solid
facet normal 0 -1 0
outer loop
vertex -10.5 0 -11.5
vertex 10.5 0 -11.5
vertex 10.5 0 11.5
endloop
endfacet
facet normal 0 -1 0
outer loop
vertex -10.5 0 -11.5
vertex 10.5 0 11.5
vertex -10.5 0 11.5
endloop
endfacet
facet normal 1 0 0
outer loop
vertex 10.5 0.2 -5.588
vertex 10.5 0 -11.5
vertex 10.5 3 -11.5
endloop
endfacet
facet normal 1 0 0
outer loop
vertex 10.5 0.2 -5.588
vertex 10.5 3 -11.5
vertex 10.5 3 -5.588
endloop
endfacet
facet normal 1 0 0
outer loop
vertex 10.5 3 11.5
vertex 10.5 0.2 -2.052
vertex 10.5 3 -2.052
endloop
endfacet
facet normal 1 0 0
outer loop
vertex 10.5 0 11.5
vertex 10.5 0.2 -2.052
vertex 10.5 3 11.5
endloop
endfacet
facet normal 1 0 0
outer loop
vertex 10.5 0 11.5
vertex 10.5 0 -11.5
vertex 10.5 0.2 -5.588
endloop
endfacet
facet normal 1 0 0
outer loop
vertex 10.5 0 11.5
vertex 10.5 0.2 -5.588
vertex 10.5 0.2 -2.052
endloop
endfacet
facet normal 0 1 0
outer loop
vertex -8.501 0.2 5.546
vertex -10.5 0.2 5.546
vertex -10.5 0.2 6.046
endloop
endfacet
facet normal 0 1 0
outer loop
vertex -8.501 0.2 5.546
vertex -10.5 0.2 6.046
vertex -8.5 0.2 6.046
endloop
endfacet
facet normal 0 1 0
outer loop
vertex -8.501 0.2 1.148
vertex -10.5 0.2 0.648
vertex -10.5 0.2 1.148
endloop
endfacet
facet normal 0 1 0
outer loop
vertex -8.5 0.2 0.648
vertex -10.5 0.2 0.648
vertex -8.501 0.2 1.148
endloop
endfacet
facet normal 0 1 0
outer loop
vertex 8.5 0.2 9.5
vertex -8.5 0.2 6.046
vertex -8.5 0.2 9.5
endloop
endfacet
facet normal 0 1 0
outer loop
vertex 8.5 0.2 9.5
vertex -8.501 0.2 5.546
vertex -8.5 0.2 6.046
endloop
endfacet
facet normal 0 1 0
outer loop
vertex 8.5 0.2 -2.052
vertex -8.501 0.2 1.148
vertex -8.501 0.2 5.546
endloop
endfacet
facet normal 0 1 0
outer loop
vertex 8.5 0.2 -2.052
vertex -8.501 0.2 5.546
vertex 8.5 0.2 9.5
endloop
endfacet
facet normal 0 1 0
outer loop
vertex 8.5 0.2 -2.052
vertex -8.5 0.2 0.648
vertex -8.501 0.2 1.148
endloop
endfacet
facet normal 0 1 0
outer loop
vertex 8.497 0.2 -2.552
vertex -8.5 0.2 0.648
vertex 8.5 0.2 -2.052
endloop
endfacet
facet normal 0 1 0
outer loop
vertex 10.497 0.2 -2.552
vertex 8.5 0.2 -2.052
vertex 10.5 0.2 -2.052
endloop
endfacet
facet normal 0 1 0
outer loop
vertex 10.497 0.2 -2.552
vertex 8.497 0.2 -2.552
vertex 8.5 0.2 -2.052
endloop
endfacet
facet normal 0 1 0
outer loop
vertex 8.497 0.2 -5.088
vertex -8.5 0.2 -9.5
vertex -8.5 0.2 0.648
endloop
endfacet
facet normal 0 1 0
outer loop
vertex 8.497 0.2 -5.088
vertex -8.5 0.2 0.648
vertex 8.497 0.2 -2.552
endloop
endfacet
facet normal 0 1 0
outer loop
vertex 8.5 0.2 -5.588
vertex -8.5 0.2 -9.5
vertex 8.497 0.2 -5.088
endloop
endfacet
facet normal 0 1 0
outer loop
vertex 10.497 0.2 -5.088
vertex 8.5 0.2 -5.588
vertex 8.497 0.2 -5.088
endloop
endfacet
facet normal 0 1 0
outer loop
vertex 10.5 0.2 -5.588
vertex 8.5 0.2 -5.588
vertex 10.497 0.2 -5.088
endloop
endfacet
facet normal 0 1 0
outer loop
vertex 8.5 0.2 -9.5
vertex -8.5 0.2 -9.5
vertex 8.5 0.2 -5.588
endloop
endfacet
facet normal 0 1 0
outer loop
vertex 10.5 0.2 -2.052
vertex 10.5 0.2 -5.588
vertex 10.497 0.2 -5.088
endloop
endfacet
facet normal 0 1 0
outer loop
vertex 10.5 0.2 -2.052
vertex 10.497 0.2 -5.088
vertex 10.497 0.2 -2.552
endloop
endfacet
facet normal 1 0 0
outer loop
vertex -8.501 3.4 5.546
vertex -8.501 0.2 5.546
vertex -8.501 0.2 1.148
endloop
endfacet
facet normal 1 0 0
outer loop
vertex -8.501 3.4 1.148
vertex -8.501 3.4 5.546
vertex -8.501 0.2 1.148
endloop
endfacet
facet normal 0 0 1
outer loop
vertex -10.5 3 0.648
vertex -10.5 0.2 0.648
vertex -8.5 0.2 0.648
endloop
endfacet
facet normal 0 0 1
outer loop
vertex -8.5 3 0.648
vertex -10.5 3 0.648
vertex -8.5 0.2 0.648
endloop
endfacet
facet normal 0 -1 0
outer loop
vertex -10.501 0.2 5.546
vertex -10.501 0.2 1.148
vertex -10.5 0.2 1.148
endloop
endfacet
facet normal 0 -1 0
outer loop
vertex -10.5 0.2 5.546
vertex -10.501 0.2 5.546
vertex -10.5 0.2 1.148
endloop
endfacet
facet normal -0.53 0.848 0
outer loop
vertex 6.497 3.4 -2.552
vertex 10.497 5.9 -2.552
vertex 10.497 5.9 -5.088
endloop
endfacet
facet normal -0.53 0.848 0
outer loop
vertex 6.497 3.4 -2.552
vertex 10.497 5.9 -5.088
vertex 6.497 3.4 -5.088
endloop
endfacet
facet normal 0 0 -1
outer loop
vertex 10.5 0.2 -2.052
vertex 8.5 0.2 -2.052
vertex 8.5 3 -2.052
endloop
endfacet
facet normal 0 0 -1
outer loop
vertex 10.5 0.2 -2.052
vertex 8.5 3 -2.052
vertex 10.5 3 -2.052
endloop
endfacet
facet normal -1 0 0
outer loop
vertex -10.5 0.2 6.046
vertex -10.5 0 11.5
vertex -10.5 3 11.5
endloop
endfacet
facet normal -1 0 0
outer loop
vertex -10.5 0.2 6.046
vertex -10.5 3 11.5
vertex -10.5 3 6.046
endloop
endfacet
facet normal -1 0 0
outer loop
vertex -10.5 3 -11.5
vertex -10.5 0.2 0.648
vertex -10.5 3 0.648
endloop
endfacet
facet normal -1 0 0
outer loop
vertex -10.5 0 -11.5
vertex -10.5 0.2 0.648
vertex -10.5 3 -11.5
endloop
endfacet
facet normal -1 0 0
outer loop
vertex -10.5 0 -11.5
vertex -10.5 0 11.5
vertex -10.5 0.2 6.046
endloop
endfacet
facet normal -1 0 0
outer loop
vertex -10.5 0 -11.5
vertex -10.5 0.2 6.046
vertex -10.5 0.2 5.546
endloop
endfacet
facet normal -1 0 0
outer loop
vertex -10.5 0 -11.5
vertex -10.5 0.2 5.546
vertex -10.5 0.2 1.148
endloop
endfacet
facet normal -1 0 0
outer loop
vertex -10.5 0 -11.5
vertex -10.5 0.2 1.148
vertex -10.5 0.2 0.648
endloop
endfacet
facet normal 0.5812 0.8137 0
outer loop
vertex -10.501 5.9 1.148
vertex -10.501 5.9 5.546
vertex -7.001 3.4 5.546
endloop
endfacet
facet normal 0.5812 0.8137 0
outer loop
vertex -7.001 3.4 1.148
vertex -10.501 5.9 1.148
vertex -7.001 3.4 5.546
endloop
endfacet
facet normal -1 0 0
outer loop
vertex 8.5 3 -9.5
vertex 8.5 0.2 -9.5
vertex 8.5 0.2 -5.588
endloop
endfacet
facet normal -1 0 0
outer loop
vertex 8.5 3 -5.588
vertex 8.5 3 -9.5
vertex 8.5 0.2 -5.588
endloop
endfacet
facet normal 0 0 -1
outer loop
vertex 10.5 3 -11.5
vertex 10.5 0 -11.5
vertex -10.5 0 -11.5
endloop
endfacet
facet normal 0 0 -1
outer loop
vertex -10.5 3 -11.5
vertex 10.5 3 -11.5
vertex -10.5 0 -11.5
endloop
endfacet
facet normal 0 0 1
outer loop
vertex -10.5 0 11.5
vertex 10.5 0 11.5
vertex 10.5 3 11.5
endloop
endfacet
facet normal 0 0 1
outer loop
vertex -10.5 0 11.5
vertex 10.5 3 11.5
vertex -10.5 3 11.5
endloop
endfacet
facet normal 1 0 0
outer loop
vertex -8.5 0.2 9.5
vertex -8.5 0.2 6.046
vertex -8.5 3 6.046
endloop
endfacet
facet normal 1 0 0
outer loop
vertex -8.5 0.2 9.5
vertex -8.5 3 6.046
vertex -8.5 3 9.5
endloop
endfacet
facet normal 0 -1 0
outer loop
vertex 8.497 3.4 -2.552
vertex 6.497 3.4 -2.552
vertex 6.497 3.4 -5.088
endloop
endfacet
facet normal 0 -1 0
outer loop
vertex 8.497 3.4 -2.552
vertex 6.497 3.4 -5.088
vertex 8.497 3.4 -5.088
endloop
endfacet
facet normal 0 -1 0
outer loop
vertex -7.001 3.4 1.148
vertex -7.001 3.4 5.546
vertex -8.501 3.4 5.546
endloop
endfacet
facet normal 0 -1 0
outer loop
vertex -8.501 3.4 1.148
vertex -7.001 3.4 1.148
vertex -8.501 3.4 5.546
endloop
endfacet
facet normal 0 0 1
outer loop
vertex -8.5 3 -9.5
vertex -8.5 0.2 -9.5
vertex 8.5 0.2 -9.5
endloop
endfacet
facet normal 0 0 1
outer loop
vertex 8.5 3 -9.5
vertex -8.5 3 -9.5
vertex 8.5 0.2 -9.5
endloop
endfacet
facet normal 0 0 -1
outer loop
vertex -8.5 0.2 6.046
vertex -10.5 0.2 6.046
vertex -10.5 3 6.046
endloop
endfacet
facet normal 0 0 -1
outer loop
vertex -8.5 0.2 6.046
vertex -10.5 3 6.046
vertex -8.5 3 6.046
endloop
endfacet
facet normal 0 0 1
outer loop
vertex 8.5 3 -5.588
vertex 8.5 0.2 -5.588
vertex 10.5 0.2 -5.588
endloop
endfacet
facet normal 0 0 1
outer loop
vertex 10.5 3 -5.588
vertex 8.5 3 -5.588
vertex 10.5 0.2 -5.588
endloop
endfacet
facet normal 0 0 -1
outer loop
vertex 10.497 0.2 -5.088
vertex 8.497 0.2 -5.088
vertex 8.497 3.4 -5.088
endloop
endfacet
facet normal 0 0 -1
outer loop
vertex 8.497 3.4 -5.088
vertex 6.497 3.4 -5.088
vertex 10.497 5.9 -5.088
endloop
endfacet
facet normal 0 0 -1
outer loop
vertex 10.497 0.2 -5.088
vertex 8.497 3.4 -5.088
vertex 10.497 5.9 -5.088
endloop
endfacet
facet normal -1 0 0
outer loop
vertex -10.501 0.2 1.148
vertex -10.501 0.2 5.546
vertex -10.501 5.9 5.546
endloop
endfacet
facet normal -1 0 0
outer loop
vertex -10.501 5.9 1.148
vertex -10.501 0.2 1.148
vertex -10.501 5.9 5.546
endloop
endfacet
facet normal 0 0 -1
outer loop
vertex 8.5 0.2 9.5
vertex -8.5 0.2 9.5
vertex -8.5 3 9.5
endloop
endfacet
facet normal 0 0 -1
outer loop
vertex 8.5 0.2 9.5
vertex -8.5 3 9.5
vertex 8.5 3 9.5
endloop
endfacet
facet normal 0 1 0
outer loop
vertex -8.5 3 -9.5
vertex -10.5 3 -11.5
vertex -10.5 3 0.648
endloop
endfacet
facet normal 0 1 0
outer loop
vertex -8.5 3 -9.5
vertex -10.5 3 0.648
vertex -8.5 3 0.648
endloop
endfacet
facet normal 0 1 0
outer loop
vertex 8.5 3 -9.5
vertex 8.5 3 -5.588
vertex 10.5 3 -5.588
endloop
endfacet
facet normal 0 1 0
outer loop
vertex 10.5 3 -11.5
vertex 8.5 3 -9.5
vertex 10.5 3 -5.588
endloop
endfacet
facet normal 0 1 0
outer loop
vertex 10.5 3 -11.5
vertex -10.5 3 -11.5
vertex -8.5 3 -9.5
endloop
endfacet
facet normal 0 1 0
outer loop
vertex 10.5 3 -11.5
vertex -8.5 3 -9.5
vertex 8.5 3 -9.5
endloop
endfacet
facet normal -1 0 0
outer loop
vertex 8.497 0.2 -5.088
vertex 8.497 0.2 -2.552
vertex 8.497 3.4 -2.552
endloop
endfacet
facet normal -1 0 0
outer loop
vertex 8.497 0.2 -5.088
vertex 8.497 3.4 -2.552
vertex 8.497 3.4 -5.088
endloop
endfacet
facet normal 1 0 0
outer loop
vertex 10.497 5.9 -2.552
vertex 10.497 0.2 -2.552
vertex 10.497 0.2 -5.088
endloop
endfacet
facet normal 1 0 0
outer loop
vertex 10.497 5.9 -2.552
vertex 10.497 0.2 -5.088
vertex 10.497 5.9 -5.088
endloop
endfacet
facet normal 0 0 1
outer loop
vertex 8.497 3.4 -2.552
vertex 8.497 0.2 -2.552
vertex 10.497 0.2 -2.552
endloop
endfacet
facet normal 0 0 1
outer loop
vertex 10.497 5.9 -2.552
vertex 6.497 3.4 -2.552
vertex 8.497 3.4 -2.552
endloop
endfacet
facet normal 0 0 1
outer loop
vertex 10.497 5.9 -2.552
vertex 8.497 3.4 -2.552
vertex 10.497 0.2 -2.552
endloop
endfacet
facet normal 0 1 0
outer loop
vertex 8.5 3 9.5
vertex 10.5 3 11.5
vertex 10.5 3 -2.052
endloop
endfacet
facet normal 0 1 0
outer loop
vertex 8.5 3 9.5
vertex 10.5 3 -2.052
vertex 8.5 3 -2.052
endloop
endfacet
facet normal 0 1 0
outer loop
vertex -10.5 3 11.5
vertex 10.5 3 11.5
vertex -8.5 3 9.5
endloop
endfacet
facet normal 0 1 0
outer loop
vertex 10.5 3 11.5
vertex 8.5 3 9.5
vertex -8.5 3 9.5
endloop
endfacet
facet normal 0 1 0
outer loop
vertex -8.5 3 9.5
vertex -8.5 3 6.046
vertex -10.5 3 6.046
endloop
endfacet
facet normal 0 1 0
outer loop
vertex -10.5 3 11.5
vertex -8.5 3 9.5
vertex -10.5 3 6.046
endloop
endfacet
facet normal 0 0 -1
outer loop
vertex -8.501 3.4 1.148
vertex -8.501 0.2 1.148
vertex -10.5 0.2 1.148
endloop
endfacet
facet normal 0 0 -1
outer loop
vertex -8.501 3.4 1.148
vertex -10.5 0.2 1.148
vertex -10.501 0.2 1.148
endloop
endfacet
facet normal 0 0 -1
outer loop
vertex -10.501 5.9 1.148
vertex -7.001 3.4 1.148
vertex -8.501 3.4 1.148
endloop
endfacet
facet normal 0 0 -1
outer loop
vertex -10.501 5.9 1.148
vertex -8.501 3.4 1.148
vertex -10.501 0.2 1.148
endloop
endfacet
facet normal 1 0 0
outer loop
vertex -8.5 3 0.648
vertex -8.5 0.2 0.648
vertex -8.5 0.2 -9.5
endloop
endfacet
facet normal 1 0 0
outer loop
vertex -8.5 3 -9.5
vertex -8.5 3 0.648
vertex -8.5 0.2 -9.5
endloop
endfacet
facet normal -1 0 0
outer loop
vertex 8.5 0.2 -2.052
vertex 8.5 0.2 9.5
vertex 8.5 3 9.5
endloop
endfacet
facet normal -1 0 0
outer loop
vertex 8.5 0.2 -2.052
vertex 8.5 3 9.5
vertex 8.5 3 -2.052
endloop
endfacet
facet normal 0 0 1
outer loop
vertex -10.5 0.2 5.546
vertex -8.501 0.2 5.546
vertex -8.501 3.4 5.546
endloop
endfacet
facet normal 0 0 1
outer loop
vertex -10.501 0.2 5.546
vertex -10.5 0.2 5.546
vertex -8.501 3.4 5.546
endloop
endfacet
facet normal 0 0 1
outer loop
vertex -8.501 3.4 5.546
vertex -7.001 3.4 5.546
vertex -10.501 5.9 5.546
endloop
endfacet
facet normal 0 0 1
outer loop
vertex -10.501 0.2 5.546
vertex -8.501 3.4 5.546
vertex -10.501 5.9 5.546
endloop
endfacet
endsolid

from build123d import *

# Parameters (mm, degrees)
BOSS_EXTRUDE2_DEPTH   = 3
BOSS_EXTRUDE2_2_DEPTH = 3
SKETCH4_W             = 21
SKETCH4_H             = 23
BOSS_EXTRUDE4_DEPTH   = 0.2
SKETCH6_W             = 2
SKETCH6_H             = 4.398930514
SKETCH6_H_2           = 2.53591928
BOSS_EXTRUDE5_DEPTH   = 3.2
BOSS_EXTRUDE6_DEPTH   = 4.398930514
BOSS_EXTRUDE7_DEPTH   = 2.53591928


with BuildPart() as part:
    # Sketch1 → Boss-Extrude2 (new body)
    with BuildSketch(Plane(origin=(0, 0, 0), x_dir=(1, 0, 0), z_dir=(0, 1, 0))):
        Polygon((-10.5, -11.5), (-10.5, -6.046480624), (-8.5, -6.046480624), (-8.5, -9.5), (8.5, -9.5), (8.5, 2.051915147), (10.5, 2.051915147), (10.5, -11.5), align=None)
    extrude(amount=BOSS_EXTRUDE2_DEPTH)



with BuildPart() as body_2:
    # Sketch1 → Boss-Extrude2 2 (new body)
    with BuildSketch(Plane(origin=(0, 0, 0), x_dir=(1, 0, 0), z_dir=(0, 1, 0))):
        Polygon((-8.5, 9.5), (8.5, 9.5), (8.5, 5.587834427), (10.5, 5.587834427), (10.5, 11.5), (-10.5, 11.5), (-10.5, -0.64755011), (-8.5, -0.64755011), align=None)
    extrude(amount=BOSS_EXTRUDE2_2_DEPTH)


with BuildPart() as part_1:
    add(part.part)

    add(body_2.part)  # Boss-Extrude4 merges body 2
    # Sketch4 → Boss-Extrude4 (add)
    with BuildSketch(Plane(origin=(0, 0, 0), x_dir=(1, 0, 0), z_dir=(0, 1, 0))):
        Rectangle(SKETCH4_W, SKETCH4_H)
    extrude(amount=BOSS_EXTRUDE4_DEPTH)

    # Sketch6 → Boss-Extrude5 (add)
    with BuildSketch(Plane(origin=(0, 0.2, 0), x_dir=(1, 0, 0), z_dir=(0, 1, 0))):
        with Locations((-9.501045586, -3.347015367)):
            Rectangle(SKETCH6_W, SKETCH6_H)
        with Locations((9.496513771, 3.819874787)):
            Rectangle(SKETCH6_W, SKETCH6_H_2)
    extrude(amount=BOSS_EXTRUDE5_DEPTH)

    # Sketch7 → Boss-Extrude6 (add)
    with BuildSketch(Plane.XY.offset(5.546480624)):
        Polygon((-10.501045586, 3.4), (-10.501045586, 5.9), (-7.001045586, 3.4), align=None)
    extrude(amount=-BOSS_EXTRUDE6_DEPTH)

    # Sketch8 → Boss-Extrude7 (add)
    with BuildSketch(Plane.XY.offset(-2.551915147)):
        Polygon((10.496513771, 3.4), (10.496513771, 5.9), (6.496513771, 3.4), align=None)
    extrude(amount=-BOSS_EXTRUDE7_DEPTH)


solid = part_1.part
